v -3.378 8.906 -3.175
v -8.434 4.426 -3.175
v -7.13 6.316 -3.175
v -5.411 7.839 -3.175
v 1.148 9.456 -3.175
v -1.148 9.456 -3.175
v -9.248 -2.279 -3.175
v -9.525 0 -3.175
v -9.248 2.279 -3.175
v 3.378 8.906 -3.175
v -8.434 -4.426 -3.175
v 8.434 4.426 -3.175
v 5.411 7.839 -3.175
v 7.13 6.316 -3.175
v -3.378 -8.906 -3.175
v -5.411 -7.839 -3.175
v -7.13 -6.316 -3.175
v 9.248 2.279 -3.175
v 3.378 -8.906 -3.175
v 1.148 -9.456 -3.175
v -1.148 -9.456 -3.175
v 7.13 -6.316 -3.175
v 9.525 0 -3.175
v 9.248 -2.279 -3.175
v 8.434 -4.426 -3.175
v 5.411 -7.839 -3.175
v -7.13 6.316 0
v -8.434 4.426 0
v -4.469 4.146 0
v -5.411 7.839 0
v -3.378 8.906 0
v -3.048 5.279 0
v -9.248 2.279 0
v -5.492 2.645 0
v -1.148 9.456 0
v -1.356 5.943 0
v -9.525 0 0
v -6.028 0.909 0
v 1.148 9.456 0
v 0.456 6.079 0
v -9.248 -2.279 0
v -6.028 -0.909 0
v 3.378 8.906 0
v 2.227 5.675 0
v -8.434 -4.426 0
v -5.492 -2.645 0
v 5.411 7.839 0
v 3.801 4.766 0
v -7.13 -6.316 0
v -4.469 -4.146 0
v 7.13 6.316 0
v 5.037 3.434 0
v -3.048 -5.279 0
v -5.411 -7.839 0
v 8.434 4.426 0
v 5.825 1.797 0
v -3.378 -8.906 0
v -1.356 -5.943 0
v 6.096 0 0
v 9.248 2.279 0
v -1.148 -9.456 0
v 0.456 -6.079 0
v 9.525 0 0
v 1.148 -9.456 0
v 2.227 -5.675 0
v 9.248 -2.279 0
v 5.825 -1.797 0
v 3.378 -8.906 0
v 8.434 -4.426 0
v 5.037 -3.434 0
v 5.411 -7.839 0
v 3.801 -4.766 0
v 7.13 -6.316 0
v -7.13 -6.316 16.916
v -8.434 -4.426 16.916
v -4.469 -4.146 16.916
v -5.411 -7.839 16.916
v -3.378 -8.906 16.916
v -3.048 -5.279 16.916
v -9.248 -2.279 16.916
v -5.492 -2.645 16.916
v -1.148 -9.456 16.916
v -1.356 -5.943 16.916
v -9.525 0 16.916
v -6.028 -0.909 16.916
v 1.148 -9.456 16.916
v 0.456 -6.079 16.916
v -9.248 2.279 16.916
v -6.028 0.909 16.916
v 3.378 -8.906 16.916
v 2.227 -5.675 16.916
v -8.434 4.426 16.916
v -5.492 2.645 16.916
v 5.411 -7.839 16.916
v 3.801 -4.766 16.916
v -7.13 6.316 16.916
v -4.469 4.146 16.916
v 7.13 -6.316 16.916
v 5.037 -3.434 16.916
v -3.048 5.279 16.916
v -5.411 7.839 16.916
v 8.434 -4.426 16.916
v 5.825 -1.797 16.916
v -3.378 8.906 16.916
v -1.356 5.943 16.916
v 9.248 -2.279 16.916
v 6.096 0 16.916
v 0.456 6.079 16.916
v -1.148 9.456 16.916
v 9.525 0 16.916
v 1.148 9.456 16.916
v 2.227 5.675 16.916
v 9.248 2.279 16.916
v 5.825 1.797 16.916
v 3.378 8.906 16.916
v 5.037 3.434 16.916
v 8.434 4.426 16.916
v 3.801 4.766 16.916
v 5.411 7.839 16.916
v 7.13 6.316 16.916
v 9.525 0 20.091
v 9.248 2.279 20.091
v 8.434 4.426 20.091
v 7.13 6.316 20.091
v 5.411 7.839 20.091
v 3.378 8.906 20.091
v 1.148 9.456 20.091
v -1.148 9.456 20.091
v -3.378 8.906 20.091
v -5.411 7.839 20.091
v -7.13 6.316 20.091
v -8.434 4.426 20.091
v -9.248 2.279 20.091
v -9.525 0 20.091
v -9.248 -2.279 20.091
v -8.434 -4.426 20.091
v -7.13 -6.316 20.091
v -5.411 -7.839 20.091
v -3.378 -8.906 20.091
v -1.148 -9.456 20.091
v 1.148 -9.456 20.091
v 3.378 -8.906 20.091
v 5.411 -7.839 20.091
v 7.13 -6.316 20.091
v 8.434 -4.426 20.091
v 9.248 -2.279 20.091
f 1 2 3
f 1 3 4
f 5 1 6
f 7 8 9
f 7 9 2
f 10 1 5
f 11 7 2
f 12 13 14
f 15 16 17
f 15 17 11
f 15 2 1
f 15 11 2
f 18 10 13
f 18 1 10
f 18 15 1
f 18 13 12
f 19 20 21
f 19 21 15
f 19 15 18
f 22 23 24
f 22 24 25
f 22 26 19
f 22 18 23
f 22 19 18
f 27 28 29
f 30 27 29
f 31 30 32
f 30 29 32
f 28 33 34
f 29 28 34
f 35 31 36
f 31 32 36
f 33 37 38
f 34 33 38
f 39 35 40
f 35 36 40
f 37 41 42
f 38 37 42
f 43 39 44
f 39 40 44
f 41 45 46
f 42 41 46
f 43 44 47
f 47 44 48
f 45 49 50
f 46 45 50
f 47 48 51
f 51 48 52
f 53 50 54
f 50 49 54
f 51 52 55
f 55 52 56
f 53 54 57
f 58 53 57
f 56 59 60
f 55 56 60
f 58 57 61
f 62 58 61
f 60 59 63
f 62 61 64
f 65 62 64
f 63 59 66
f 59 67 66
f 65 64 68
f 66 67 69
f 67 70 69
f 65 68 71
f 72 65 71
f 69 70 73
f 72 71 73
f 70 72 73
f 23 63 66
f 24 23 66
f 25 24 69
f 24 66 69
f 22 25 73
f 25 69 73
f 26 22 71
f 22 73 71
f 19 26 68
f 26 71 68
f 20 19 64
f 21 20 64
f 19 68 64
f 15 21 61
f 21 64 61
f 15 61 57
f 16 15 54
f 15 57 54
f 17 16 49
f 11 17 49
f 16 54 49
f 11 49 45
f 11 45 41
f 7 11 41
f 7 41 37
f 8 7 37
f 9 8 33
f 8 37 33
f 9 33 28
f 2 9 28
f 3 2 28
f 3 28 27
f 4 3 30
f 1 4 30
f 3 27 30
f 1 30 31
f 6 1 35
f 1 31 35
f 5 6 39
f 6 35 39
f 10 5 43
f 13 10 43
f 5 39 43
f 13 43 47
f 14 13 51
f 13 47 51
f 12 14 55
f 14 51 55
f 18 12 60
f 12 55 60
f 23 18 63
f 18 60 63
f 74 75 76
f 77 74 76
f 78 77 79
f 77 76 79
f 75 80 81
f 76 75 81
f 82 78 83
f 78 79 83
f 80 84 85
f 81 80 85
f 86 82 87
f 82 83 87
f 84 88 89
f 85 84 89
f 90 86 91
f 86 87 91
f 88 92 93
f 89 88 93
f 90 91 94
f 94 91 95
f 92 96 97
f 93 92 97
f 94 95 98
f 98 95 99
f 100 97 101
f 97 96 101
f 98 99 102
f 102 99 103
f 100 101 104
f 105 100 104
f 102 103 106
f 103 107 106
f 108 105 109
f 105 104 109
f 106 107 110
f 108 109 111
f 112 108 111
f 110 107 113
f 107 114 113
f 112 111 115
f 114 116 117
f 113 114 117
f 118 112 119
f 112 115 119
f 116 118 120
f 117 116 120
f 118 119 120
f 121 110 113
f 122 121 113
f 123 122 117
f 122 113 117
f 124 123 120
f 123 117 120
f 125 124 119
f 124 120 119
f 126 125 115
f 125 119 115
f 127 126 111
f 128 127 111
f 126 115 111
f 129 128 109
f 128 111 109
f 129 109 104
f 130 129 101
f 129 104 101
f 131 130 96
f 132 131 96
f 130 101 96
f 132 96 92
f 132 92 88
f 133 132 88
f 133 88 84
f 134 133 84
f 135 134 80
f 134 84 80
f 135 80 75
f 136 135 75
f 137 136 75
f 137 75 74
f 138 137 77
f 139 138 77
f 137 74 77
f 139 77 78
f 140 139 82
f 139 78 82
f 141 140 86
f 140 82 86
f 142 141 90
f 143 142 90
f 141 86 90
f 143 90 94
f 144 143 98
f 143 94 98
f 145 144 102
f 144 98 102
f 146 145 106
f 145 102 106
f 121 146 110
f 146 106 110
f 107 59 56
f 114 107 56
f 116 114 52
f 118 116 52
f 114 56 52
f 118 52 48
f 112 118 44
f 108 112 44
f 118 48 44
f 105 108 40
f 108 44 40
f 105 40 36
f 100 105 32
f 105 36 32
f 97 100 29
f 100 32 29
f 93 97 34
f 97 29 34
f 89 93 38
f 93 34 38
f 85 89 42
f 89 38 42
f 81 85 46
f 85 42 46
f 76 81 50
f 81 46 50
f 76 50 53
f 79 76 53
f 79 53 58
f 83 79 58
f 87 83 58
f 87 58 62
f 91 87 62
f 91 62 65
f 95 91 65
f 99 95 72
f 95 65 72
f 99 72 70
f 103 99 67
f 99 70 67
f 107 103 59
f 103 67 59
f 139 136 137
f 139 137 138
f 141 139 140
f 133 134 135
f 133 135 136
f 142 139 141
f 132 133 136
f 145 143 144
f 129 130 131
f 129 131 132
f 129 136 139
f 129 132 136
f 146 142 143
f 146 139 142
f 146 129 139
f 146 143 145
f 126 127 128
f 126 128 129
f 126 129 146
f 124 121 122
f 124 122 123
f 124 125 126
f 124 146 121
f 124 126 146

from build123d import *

# Parameters (mm, degrees)
F0_R     = 6.096
F1_DEPTH = 16.9164
F2_R     = 9.525
F2_R_2   = 6.096
F3_DEPTH = 3.175
F4_R     = 9.525
F5_DEPTH = 3.175


# Not quite as in the source:
# - a feature names something its author has since deleted; it is built from what else it names


with BuildPart() as f1:
    # F0 (on Top) → F1 (new body)
    with BuildSketch(Plane.XY):
        Circle(F0_R)
    extrude(amount=F1_DEPTH)

    # F2 (on face) → F3 (join)
    with BuildSketch(Plane.XY.offset(16.9164)):
        Circle(F2_R)
        Circle(F2_R_2, mode=Mode.SUBTRACT)
        Circle(F2_R_2)
    extrude(amount=F3_DEPTH)

    # F4 (on face) → F5 (join)
    with BuildSketch(Plane(origin=(0, 0, 0), x_dir=(1, 0, 0), z_dir=(0, 0, -1))):
        Circle(F4_R)
    extrude(amount=F5_DEPTH)


solid = f1.part
